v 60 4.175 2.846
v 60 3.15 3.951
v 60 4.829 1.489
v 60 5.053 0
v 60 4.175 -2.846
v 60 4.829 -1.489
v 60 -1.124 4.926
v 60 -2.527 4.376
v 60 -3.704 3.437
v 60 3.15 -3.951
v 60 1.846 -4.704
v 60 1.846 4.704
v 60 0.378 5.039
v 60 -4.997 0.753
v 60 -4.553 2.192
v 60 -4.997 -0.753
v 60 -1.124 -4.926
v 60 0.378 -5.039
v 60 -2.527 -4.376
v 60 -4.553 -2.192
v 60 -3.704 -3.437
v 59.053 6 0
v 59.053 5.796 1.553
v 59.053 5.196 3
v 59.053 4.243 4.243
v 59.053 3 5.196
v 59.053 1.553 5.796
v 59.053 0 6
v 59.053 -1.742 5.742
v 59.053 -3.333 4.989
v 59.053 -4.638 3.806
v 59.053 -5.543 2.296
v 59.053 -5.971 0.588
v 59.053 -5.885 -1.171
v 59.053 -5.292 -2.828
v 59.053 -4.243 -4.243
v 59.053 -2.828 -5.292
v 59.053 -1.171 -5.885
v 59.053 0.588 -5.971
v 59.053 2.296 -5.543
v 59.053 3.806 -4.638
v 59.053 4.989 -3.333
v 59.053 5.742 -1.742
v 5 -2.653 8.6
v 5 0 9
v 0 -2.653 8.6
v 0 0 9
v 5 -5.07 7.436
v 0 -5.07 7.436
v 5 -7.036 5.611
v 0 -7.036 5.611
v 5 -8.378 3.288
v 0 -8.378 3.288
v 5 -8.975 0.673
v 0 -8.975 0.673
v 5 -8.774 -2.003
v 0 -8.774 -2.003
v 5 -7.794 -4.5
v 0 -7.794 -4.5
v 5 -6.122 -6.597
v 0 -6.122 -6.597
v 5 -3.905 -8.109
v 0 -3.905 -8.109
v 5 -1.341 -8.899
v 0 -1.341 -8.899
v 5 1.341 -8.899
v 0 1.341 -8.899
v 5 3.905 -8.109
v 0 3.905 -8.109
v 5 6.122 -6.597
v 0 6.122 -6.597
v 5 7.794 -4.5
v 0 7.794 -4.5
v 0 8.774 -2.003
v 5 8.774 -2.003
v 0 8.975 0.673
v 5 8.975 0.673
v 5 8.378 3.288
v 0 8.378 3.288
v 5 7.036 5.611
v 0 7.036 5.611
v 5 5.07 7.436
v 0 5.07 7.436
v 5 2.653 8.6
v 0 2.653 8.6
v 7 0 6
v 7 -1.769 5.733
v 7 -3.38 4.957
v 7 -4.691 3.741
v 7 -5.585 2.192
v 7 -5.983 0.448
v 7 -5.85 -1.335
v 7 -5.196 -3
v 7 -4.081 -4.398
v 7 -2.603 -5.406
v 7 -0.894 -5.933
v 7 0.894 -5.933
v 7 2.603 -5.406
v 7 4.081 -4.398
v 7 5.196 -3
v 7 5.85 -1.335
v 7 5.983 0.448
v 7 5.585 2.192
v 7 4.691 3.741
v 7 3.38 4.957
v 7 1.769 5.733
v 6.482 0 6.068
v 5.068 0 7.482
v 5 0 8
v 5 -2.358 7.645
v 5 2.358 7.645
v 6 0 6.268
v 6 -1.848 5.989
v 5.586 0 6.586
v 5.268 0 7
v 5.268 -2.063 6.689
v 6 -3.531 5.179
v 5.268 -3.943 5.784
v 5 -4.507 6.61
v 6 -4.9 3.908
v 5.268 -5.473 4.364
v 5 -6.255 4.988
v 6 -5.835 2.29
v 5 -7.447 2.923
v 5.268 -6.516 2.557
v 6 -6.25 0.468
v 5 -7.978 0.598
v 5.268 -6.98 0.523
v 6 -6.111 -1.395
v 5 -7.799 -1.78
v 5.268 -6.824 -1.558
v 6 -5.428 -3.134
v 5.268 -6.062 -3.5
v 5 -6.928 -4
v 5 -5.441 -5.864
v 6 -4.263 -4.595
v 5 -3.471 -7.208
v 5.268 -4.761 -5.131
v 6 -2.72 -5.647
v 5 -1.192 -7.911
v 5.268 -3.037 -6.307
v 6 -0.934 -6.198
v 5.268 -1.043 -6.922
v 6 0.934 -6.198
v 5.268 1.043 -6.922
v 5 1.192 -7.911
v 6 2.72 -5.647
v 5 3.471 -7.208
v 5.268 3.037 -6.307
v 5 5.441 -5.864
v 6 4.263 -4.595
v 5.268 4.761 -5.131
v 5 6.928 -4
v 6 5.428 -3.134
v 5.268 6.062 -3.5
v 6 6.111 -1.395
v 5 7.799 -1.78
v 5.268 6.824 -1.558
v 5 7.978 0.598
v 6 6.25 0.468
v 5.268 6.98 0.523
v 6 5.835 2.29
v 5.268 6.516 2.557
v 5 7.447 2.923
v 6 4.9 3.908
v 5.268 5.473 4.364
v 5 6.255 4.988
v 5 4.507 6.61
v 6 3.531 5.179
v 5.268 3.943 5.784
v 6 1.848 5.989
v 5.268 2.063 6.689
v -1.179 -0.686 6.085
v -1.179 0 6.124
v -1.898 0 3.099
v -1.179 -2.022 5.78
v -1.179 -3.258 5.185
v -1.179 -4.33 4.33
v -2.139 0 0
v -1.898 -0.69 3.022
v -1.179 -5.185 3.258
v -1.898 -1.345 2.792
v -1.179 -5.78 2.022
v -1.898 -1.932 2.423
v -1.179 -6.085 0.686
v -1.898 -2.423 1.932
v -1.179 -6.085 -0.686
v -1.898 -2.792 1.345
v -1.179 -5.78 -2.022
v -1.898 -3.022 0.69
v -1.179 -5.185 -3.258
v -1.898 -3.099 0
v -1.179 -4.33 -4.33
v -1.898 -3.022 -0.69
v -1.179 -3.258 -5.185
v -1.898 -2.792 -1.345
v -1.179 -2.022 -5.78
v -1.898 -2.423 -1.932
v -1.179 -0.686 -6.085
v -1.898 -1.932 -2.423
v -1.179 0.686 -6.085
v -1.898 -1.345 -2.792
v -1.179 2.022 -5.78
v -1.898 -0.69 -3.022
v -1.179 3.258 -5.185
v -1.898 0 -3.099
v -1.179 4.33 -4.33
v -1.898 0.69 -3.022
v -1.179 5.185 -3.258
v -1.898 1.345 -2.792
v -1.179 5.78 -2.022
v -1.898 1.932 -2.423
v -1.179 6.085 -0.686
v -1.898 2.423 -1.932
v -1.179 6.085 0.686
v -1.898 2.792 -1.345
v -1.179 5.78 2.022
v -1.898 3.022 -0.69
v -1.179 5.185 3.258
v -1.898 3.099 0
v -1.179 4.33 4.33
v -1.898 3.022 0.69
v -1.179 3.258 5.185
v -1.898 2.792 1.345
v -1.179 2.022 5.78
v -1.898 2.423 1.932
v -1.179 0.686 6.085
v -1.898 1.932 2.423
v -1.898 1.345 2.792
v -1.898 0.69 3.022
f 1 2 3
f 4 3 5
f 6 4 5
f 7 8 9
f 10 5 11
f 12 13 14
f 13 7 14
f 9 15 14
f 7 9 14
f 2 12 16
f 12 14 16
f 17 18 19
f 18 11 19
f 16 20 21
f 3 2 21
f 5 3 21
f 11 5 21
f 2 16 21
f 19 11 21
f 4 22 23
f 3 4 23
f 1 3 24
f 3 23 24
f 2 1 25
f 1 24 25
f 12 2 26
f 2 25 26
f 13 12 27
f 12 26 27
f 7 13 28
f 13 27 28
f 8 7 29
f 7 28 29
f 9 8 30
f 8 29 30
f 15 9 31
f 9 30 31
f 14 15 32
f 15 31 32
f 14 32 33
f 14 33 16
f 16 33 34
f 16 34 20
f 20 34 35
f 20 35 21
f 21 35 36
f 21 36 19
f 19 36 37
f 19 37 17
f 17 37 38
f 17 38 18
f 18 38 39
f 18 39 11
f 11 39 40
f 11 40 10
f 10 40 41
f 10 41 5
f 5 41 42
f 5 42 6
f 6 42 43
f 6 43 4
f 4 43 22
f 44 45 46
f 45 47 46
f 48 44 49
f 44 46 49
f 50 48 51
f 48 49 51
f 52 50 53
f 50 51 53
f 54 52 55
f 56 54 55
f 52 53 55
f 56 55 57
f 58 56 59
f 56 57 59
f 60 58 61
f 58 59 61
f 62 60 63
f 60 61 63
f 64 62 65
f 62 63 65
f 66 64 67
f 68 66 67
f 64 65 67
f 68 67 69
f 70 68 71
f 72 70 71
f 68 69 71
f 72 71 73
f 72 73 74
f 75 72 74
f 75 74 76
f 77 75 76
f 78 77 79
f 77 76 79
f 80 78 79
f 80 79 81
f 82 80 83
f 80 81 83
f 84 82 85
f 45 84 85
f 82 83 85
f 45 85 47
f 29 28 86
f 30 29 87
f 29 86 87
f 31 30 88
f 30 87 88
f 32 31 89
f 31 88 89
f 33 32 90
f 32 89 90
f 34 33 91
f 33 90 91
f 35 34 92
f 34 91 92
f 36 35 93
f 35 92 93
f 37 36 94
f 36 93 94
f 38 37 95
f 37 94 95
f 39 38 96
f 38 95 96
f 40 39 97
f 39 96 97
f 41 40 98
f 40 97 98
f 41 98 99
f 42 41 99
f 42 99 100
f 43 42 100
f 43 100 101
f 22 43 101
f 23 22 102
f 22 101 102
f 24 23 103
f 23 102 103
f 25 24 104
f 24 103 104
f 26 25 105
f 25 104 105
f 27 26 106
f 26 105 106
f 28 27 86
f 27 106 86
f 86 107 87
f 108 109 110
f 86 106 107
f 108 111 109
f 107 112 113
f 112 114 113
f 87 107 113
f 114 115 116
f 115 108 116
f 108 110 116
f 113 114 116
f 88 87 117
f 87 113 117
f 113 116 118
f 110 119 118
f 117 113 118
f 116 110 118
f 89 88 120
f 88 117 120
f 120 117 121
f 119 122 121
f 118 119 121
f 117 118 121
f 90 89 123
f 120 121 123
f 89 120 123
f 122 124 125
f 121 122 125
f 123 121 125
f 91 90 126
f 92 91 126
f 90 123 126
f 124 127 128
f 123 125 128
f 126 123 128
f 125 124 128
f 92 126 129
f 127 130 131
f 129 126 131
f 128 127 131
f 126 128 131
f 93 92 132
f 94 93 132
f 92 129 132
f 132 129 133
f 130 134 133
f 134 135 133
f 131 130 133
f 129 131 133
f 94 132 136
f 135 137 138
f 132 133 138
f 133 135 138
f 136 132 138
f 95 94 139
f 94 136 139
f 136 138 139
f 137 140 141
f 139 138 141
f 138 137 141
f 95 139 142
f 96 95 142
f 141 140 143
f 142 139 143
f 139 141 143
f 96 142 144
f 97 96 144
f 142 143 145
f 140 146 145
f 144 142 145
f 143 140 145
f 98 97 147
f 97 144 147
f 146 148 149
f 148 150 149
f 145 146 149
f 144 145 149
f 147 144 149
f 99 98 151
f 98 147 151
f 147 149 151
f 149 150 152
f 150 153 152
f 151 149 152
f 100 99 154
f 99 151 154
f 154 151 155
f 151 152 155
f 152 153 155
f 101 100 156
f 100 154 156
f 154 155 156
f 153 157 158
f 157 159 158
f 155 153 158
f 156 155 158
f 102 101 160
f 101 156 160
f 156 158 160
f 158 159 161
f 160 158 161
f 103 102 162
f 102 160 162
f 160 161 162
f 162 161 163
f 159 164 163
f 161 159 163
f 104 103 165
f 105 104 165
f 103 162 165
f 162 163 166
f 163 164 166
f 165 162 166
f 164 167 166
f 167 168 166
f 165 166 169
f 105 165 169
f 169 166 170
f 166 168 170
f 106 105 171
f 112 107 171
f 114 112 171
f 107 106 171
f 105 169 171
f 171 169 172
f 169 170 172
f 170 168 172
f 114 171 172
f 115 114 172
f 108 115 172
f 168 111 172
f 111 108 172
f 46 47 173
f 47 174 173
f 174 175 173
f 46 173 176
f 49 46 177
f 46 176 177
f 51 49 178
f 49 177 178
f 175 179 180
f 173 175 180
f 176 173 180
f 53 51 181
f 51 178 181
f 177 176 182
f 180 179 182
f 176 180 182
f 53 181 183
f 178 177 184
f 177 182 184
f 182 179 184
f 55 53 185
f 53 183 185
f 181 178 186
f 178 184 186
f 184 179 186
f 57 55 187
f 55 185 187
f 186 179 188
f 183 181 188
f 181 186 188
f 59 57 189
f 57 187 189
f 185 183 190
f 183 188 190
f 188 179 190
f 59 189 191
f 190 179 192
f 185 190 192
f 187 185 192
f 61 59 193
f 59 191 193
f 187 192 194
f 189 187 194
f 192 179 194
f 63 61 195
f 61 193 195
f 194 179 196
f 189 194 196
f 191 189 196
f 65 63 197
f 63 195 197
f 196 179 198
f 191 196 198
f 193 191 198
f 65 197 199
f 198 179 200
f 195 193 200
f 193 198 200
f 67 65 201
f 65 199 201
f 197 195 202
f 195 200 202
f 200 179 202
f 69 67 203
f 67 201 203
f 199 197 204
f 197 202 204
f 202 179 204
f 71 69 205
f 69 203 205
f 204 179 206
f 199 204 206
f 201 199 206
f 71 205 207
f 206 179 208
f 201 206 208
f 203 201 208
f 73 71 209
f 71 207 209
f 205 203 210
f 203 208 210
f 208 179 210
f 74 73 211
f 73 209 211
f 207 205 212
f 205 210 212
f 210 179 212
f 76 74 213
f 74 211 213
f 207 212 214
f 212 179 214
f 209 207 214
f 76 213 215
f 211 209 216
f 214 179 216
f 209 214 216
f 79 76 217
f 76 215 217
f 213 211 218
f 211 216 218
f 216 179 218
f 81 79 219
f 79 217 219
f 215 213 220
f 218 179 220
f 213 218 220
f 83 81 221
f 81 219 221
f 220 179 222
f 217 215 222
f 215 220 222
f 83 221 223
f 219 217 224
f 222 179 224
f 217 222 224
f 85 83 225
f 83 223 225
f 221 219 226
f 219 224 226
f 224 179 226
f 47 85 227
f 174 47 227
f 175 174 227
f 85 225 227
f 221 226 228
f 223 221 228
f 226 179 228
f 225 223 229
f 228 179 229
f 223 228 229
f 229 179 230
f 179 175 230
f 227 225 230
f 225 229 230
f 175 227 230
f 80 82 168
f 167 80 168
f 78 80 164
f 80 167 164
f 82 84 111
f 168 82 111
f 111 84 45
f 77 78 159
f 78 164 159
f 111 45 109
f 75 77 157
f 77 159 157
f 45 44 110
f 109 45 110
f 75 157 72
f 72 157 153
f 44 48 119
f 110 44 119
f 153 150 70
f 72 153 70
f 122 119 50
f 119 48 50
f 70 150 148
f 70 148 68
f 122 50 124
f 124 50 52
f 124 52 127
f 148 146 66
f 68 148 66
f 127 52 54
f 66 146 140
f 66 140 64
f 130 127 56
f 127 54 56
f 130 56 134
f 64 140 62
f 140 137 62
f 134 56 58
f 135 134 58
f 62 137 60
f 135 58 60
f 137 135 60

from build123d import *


# Read off the part's stored shape, not the designer's step: M12 机械螺纹 螺柱1
with BuildPart() as part:
    # 草图1 → 旋转1 (revolve)
    with BuildSketch(Plane.XY, mode=Mode.PRIVATE) as revolve_1_sk:
        with BuildLine():
            Line((60, 0), (60, 6))
            Line((60, 6), (7, 6))
            ThreePointArc((7, 6), (5.585786438, 6.585786438), (5, 8))
            Line((5, 8), (5, 9))
            Line((5, 9), (0, 9))
            ThreePointArc((0, 9), (-1.597221966, 4.625396092), (-2.139428901, 0))
            Line((-2.139428901, 0), (60, 0))
        make_face()
    revolve(revolve_1_sk.sketch.rotate(Axis((0, 0, 0), (1, 0, 0)), 90), axis=Axis((0, 0, 0), (1, 0, 0)))

    # M12 机械螺纹 螺柱1 outline → M12 机械螺纹 螺柱1 (revolve, cut)
    with BuildSketch(Plane.YX):
        Polygon((6, 60), (5.053, 60), (6, 59.053), align=None)
    revolve(axis=Axis((0, 0, 0), (1, 0, 0)), mode=Mode.SUBTRACT)


solid = part.part
